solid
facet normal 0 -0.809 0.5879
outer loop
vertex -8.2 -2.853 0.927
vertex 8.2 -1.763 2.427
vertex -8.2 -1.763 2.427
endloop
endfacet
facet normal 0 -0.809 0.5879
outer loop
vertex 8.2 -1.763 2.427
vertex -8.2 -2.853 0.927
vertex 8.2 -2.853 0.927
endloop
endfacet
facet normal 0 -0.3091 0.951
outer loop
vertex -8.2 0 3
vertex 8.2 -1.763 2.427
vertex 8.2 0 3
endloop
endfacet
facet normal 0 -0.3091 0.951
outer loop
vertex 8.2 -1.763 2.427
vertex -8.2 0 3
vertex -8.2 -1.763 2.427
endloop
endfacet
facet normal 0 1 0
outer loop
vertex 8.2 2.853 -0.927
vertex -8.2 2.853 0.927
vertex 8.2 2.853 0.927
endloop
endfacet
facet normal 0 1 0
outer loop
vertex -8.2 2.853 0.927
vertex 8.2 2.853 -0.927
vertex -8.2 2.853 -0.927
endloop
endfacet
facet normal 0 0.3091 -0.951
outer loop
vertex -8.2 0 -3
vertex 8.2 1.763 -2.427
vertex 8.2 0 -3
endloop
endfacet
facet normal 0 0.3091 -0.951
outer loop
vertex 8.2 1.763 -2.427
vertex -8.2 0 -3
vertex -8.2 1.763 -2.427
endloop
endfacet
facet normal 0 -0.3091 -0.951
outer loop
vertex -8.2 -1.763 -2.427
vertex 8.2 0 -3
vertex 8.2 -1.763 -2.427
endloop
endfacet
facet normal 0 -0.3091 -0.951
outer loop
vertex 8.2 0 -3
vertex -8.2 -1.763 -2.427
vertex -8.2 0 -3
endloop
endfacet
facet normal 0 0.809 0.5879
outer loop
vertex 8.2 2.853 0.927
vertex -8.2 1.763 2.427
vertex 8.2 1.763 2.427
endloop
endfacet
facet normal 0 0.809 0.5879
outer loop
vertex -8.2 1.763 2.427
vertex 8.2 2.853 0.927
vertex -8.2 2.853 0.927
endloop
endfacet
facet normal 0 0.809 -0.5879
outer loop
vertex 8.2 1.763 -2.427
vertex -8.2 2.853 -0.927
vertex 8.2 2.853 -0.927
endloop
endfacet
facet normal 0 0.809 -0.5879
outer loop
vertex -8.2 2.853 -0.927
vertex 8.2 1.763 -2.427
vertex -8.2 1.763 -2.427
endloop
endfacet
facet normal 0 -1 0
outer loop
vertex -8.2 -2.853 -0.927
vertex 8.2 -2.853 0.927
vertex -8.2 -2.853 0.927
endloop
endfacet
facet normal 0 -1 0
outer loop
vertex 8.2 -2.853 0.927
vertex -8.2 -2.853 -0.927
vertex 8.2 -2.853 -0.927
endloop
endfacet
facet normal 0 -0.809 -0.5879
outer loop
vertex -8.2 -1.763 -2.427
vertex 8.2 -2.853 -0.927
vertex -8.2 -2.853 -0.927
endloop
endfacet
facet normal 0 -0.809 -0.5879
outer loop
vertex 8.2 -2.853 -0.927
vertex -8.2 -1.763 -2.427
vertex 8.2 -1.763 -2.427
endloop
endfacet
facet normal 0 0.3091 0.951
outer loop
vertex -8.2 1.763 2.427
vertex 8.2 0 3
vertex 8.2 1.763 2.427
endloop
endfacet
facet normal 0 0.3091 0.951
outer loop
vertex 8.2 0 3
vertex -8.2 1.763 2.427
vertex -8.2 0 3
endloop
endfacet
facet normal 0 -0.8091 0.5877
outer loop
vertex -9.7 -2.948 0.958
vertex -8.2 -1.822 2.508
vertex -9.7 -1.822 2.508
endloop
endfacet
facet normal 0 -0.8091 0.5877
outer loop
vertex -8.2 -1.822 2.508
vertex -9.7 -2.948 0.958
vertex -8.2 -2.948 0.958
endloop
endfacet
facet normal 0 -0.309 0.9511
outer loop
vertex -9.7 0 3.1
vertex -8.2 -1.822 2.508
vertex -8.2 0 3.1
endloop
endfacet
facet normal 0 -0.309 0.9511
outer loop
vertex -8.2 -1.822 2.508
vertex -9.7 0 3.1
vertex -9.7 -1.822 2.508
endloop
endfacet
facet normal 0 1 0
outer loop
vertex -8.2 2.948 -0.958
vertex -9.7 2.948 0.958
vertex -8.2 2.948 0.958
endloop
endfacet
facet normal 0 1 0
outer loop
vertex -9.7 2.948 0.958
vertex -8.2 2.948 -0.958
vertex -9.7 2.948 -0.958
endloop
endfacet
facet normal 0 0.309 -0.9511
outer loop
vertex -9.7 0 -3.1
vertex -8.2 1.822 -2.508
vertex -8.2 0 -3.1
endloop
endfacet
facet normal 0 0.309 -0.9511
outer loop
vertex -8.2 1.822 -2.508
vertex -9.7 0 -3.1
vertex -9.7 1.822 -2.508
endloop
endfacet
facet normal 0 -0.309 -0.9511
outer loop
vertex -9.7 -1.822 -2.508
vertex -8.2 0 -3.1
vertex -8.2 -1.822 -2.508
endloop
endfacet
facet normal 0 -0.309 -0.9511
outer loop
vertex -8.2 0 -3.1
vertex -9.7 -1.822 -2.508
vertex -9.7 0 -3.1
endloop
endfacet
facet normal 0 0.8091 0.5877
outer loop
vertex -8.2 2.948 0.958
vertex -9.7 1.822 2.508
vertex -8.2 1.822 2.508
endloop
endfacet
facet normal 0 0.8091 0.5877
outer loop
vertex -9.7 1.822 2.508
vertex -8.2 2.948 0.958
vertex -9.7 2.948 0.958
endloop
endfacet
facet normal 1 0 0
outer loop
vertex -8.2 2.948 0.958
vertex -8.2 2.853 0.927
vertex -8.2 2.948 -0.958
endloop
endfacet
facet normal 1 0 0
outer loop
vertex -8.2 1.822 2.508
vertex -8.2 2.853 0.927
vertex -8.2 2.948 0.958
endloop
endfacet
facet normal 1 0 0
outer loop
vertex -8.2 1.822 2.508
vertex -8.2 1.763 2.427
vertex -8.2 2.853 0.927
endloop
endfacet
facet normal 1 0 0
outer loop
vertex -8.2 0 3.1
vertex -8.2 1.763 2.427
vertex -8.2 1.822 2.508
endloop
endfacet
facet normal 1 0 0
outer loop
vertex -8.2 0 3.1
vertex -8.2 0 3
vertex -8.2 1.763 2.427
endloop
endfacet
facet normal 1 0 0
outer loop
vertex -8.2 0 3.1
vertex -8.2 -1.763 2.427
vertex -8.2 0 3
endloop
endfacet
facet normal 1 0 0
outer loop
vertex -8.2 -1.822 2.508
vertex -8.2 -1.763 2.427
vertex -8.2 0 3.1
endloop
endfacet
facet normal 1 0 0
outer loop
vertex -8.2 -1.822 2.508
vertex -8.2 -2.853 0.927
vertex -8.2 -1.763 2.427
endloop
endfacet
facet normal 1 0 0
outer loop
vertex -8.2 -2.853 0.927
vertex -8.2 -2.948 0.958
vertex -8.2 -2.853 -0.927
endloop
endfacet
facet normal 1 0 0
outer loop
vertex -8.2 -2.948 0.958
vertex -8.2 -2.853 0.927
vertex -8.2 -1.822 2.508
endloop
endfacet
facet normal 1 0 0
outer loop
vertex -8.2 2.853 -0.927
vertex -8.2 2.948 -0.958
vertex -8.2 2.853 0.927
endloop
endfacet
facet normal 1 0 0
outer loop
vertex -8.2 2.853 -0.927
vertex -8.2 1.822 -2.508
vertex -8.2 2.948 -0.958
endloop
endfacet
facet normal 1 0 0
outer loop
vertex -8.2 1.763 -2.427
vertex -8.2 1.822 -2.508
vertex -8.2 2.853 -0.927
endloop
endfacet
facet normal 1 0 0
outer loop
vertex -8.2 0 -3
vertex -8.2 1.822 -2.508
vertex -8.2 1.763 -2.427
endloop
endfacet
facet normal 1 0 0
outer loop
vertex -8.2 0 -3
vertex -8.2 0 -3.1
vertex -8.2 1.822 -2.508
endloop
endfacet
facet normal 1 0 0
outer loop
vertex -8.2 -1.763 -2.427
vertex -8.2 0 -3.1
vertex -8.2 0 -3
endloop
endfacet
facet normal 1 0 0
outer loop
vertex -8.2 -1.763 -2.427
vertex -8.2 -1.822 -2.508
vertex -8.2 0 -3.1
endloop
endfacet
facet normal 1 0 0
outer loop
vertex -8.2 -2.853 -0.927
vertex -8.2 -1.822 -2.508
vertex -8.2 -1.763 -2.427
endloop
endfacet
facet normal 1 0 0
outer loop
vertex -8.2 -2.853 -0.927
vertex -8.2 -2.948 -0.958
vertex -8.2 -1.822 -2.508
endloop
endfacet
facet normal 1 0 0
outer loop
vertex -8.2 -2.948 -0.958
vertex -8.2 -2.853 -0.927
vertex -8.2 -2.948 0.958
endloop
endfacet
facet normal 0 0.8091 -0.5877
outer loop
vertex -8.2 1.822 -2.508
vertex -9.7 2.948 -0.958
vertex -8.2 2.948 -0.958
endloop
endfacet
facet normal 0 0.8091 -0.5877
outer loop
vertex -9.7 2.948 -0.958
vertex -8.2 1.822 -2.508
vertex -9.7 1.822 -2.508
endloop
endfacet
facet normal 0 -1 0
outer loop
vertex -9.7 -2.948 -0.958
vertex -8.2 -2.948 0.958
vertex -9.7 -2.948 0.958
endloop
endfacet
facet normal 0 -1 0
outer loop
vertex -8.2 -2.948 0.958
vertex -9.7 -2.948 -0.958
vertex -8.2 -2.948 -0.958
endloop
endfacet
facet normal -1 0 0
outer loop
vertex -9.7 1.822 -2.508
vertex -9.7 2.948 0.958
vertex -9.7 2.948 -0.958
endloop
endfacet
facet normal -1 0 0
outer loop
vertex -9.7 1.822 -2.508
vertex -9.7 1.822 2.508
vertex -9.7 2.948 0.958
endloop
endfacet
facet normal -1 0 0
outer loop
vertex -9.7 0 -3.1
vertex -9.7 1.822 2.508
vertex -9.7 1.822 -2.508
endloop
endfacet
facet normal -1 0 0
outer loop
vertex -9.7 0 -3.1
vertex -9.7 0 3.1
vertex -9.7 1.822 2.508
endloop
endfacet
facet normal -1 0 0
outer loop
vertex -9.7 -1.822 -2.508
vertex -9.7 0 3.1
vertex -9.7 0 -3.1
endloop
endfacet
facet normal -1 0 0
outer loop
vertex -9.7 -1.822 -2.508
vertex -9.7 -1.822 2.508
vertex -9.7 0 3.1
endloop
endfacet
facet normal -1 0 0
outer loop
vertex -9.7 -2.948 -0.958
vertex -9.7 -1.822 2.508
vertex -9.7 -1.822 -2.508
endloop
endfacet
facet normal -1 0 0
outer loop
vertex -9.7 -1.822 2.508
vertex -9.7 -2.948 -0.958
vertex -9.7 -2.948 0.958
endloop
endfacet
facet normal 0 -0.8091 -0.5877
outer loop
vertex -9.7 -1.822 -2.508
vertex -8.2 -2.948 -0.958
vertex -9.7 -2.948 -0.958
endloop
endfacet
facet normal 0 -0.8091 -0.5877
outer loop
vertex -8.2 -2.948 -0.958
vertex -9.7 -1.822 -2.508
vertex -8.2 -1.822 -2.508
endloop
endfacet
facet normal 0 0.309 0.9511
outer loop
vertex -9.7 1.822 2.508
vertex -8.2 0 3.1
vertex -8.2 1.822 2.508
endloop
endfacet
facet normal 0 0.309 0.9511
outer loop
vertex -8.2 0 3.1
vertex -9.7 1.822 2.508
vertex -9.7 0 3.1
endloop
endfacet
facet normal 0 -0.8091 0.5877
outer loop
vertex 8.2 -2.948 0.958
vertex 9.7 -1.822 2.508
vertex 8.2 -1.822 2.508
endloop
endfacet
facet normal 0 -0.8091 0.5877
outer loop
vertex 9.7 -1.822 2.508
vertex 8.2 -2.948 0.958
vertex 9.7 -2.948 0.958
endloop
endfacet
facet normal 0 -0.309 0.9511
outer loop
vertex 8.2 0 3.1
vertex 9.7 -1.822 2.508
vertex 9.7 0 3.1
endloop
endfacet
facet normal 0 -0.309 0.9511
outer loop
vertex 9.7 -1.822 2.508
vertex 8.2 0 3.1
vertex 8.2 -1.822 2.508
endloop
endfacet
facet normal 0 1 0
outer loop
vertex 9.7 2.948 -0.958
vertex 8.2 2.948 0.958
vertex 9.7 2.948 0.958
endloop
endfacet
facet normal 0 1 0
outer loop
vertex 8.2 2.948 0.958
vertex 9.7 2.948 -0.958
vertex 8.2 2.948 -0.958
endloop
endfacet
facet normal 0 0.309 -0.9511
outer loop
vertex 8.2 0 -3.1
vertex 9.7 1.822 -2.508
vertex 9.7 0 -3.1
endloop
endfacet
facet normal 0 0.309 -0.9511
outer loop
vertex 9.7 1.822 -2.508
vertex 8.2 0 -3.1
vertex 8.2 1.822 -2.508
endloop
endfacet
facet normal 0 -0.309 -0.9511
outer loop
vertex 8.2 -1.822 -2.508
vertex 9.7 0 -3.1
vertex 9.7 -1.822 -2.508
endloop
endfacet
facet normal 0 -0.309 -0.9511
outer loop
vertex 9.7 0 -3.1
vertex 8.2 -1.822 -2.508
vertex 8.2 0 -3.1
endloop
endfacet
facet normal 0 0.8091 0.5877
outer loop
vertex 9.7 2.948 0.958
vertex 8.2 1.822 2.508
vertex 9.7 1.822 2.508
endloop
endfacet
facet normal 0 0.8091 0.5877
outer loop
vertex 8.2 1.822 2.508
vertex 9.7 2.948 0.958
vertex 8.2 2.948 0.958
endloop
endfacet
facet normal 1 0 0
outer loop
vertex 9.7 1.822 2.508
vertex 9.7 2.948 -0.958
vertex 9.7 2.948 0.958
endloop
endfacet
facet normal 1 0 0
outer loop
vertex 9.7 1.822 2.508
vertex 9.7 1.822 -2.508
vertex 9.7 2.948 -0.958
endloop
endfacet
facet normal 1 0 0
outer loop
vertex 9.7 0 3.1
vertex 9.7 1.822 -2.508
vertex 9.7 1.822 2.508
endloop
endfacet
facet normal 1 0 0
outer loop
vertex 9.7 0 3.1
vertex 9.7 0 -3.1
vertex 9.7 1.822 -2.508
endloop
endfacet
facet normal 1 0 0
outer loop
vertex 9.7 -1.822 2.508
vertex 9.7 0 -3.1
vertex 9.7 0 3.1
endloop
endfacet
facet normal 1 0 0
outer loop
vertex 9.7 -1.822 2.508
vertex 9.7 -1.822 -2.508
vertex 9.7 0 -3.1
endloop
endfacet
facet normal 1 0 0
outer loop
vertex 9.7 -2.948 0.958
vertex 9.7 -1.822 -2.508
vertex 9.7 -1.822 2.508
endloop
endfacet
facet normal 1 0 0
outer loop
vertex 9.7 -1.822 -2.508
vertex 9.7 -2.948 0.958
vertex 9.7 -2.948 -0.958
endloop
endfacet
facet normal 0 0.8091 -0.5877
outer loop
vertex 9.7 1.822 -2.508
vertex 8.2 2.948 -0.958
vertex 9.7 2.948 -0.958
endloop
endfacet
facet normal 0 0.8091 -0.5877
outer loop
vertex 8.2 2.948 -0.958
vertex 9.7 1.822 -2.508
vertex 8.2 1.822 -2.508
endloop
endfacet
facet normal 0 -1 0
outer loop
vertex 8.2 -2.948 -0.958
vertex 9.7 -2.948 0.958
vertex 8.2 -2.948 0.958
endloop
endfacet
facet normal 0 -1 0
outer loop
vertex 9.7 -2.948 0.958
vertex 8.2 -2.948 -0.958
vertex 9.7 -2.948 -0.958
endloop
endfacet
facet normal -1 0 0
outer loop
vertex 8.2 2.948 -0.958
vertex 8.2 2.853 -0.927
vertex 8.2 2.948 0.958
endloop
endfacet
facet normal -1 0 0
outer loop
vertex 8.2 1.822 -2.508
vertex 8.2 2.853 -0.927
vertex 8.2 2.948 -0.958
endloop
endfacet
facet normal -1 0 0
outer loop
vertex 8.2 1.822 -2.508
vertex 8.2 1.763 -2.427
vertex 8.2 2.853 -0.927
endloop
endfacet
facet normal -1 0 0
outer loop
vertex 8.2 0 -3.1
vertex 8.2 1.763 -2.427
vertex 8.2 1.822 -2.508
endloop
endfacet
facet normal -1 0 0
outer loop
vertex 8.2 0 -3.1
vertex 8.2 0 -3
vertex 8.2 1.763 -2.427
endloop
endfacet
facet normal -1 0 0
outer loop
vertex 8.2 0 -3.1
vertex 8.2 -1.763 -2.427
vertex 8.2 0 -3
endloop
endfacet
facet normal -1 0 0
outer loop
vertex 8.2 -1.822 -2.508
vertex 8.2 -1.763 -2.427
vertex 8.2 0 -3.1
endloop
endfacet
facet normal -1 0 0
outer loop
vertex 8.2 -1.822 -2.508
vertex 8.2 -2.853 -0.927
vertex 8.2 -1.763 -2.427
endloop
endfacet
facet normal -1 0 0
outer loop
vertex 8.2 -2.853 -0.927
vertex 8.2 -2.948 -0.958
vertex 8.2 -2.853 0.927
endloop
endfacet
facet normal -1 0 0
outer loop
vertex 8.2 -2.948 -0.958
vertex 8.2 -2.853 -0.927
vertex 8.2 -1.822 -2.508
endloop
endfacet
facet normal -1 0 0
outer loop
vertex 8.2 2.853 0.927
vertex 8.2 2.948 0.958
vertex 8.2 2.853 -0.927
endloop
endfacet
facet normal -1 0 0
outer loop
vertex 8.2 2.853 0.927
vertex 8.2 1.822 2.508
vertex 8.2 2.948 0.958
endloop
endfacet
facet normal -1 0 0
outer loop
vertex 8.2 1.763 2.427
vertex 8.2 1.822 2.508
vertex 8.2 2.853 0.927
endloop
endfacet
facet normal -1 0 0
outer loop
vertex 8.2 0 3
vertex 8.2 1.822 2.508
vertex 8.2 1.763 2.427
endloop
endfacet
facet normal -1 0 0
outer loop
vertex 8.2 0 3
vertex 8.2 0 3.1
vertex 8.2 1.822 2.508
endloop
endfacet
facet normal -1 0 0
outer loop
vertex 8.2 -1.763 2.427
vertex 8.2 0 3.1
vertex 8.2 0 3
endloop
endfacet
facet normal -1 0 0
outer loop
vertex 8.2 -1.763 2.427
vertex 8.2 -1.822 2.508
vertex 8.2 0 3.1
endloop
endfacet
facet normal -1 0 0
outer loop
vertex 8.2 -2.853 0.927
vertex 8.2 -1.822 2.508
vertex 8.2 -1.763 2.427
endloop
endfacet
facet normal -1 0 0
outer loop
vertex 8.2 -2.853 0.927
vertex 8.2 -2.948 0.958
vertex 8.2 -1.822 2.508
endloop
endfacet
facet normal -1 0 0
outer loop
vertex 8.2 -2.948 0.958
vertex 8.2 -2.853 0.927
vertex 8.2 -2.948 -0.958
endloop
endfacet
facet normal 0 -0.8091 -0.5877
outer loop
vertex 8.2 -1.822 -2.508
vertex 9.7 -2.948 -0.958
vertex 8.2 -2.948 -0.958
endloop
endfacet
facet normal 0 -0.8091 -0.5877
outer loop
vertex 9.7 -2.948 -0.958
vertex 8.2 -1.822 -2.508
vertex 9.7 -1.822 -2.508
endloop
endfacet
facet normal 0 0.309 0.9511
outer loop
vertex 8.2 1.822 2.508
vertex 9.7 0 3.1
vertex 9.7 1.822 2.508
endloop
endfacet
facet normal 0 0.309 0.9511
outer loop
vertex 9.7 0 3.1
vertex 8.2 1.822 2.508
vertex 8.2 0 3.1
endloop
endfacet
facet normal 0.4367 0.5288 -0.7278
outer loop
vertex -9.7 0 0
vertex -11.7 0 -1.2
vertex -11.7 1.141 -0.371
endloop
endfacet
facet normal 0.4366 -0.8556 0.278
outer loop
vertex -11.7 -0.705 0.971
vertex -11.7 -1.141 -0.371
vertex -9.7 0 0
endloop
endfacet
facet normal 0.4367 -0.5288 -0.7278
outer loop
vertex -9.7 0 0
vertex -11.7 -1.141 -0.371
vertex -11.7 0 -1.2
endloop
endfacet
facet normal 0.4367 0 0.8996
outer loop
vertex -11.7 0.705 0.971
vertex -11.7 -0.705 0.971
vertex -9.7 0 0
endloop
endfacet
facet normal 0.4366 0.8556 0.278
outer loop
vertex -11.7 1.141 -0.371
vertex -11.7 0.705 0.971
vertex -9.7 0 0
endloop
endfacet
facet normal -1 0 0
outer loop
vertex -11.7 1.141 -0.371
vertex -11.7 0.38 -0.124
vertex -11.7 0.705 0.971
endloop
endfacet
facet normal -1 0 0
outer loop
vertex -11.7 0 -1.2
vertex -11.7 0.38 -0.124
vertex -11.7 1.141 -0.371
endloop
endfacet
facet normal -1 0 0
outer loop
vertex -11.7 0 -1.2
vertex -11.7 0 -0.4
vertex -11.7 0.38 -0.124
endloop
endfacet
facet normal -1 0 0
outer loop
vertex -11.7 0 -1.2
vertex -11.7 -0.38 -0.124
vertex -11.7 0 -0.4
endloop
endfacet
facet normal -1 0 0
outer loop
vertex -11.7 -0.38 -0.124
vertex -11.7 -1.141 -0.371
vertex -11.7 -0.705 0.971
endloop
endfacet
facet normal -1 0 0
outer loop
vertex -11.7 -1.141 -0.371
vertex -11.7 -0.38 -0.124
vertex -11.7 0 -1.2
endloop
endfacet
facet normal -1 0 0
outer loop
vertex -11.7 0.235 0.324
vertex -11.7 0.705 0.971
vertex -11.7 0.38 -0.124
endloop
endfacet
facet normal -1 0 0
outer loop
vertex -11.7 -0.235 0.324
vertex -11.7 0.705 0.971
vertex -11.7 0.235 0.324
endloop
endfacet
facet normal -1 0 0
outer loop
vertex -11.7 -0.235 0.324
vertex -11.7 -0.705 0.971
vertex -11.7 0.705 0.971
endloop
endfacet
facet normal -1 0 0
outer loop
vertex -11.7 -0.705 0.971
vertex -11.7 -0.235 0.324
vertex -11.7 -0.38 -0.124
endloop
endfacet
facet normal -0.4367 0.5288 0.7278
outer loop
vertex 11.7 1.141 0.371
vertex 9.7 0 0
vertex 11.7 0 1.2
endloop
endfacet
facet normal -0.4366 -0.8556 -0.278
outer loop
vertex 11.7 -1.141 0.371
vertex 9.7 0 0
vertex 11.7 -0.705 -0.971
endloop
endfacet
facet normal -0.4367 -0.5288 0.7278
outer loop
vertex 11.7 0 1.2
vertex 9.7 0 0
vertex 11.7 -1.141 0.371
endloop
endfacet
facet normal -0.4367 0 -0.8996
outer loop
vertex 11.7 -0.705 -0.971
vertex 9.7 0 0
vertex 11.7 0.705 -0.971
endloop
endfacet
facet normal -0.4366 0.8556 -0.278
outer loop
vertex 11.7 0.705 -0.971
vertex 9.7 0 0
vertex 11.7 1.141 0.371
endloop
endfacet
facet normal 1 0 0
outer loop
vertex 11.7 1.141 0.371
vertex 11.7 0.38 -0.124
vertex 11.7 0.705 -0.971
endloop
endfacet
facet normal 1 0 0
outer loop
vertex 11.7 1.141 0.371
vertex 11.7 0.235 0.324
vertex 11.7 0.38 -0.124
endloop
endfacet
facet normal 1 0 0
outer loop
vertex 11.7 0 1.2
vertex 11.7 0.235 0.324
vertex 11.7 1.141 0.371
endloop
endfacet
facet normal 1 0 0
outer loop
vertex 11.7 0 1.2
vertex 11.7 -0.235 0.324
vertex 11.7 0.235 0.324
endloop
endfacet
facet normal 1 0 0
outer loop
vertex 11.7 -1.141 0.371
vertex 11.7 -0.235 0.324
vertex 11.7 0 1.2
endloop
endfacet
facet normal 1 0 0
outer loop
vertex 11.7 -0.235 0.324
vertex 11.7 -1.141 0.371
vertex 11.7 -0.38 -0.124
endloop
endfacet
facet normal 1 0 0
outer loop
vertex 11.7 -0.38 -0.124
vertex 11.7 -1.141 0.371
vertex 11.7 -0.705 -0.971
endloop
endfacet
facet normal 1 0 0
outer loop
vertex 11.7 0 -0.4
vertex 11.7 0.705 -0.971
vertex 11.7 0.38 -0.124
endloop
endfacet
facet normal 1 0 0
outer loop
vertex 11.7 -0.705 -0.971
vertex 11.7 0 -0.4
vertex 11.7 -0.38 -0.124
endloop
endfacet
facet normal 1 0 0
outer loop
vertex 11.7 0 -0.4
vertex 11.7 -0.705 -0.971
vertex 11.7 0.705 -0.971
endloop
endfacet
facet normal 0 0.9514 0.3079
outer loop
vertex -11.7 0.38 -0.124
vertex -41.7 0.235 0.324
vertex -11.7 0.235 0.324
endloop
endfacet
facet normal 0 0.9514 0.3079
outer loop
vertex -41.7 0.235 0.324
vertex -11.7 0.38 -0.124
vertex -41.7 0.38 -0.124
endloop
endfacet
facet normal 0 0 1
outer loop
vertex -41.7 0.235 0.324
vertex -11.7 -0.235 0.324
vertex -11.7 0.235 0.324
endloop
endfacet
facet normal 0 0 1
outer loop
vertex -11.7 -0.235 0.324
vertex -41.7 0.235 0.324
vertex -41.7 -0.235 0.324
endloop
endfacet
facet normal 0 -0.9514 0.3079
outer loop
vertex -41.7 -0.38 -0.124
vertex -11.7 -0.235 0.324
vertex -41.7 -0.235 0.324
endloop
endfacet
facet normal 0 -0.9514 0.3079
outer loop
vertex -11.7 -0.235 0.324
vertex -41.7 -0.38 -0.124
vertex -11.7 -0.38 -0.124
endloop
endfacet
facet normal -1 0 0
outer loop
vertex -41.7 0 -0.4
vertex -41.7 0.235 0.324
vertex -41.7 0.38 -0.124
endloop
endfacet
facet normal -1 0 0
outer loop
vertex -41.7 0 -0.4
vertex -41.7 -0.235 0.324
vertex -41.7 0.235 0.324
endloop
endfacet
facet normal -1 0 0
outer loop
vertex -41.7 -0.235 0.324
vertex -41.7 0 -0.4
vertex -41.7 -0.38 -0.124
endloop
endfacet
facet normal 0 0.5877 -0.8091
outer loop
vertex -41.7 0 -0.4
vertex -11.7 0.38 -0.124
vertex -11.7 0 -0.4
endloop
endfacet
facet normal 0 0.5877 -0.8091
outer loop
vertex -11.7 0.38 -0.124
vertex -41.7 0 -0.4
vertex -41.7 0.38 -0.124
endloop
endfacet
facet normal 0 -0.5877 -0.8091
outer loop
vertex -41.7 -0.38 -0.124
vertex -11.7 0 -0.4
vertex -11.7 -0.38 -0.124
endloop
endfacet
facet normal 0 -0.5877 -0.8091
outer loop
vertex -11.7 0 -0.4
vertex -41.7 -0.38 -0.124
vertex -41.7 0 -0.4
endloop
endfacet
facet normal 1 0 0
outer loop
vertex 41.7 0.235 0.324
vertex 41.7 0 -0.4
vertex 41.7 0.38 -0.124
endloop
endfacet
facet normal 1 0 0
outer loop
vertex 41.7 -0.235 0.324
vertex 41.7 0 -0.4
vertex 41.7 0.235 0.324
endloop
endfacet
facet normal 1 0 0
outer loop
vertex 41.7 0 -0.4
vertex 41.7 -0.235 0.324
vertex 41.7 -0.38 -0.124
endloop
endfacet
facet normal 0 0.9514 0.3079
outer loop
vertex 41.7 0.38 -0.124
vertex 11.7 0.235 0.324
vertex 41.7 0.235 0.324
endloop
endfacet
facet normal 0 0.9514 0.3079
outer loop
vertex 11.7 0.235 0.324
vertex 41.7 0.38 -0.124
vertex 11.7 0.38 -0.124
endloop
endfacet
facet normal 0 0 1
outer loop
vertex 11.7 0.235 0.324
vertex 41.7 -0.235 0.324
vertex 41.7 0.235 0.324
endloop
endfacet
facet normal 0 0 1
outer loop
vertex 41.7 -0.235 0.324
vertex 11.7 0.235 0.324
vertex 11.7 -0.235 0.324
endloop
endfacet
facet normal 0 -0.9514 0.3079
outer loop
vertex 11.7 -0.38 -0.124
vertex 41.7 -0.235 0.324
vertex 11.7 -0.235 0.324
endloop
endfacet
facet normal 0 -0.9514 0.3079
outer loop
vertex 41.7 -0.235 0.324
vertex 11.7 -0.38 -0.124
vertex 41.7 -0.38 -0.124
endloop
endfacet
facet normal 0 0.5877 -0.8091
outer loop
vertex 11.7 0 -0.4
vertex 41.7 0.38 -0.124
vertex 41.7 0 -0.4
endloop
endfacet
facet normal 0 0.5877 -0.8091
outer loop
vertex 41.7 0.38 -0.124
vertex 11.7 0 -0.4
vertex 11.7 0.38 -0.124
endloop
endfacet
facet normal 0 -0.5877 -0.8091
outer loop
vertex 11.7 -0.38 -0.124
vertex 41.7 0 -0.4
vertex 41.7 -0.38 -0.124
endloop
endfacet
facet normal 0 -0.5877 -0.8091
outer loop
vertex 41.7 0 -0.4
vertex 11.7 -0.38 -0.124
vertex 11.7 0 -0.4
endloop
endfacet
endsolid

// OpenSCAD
// Parameters
resistance_ohms = 5.6; //[2.8:11.2:0.1]
power_w = 3; //[1.5:6:0.5]
body_length_mm = 18; //[9:36:0.5]
body_diameter_mm = 6; //[3:12:0.25]
end_cap_length_mm = 1.5; //[0.75:3:0.1]
end_cap_diameter_mm = 6.2; //[3.1:12.4:0.25]
lead_diameter_mm = 0.8; //[0.4:1.6:0.05]
lead_length_each_mm = 30; //[15:60:1]
lead_exit_fillet_radius_mm = 1.2; //[0.6:2.4:0.1]
lead_exit_fillet_length_mm = 2.0; //[1.0:4.0:0.1]
overlap_mm = 0.8; //[0.5:2.0:0.1]
lead_spacing_mm = 78; //[39:156:1]
tolerance = 0.2; //[0.1:0.5:0.05]

// Resistor - complete geometry
module resistor() {
  color("DimGray") {
    // Body
    translate([0, 0, 0])
      rotate([0, 90, 0])
      cylinder(r=body_diameter_mm/2, h=body_length_mm, center=true);
    
    // End Caps
    translate([-(body_length_mm/2 + end_cap_length_mm/2 - overlap_mm), 0, 0])
      rotate([0, 90, 0])
      cylinder(r=end_cap_diameter_mm/2, h=end_cap_length_mm, center=true);
    translate([(body_length_mm/2 + end_cap_length_mm/2 - overlap_mm), 0, 0])
      rotate([0, 90, 0])
      cylinder(r=end_cap_diameter_mm/2, h=end_cap_length_mm, center=true);
    
    // Lead Exit Fillets
    translate([-(body_length_mm/2 + end_cap_length_mm + lead_exit_fillet_length_mm/2 - overlap_mm), 0, 0])
      rotate([0, 90, 0])
      cylinder(r1=lead_exit_fillet_radius_mm, r2=0, h=lead_exit_fillet_length_mm, center=true);
    translate([(body_length_mm/2 + end_cap_length_mm + lead_exit_fillet_length_mm/2 - overlap_mm), 0, 0])
      rotate([0, -90, 0])
      cylinder(r1=lead_exit_fillet_radius_mm, r2=0, h=lead_exit_fillet_length_mm, center=true);
    
    // Axial Leads
    translate([-(body_length_mm/2 + end_cap_length_mm + lead_exit_fillet_length_mm + lead_length_each_mm/2 - overlap_mm), 0, 0])
      rotate([0, 90, 0])
      cylinder(r=lead_diameter_mm/2, h=lead_length_each_mm, center=true);
    translate([(body_length_mm/2 + end_cap_length_mm + lead_exit_fillet_length_mm + lead_length_each_mm/2 - overlap_mm), 0, 0])
      rotate([0, 90, 0])
      cylinder(r=lead_diameter_mm/2, h=lead_length_each_mm, center=true);
  }
}

// Sleeved Resistor - complete geometry
module sleeved_resistor() {
  color("DimGray") {
    resistor();
    // Additional sleeving logic can be added here if needed
  }
}

// Al Clad Resistor Assembly - complete geometry
module al_clad_resistor_assembly() {
  color("DimGray") {
    sleeved_resistor();
    // Additional assembly logic can be added here if needed
  }
}

// Al Clad Resistor - complete geometry
module al_clad_resistor() {
  color("DimGray") {
    al_clad_resistor_assembly();
    // Additional logic for leads or other features can be added here if needed
  }
}

// Assembly
module assembly() {
  resistor();
  translate([0, 0, 0]) sleeved_resistor();
  translate([0, 0, 0]) al_clad_resistor_assembly();
  translate([0, 0, 0]) al_clad_resistor();
}

assembly();
